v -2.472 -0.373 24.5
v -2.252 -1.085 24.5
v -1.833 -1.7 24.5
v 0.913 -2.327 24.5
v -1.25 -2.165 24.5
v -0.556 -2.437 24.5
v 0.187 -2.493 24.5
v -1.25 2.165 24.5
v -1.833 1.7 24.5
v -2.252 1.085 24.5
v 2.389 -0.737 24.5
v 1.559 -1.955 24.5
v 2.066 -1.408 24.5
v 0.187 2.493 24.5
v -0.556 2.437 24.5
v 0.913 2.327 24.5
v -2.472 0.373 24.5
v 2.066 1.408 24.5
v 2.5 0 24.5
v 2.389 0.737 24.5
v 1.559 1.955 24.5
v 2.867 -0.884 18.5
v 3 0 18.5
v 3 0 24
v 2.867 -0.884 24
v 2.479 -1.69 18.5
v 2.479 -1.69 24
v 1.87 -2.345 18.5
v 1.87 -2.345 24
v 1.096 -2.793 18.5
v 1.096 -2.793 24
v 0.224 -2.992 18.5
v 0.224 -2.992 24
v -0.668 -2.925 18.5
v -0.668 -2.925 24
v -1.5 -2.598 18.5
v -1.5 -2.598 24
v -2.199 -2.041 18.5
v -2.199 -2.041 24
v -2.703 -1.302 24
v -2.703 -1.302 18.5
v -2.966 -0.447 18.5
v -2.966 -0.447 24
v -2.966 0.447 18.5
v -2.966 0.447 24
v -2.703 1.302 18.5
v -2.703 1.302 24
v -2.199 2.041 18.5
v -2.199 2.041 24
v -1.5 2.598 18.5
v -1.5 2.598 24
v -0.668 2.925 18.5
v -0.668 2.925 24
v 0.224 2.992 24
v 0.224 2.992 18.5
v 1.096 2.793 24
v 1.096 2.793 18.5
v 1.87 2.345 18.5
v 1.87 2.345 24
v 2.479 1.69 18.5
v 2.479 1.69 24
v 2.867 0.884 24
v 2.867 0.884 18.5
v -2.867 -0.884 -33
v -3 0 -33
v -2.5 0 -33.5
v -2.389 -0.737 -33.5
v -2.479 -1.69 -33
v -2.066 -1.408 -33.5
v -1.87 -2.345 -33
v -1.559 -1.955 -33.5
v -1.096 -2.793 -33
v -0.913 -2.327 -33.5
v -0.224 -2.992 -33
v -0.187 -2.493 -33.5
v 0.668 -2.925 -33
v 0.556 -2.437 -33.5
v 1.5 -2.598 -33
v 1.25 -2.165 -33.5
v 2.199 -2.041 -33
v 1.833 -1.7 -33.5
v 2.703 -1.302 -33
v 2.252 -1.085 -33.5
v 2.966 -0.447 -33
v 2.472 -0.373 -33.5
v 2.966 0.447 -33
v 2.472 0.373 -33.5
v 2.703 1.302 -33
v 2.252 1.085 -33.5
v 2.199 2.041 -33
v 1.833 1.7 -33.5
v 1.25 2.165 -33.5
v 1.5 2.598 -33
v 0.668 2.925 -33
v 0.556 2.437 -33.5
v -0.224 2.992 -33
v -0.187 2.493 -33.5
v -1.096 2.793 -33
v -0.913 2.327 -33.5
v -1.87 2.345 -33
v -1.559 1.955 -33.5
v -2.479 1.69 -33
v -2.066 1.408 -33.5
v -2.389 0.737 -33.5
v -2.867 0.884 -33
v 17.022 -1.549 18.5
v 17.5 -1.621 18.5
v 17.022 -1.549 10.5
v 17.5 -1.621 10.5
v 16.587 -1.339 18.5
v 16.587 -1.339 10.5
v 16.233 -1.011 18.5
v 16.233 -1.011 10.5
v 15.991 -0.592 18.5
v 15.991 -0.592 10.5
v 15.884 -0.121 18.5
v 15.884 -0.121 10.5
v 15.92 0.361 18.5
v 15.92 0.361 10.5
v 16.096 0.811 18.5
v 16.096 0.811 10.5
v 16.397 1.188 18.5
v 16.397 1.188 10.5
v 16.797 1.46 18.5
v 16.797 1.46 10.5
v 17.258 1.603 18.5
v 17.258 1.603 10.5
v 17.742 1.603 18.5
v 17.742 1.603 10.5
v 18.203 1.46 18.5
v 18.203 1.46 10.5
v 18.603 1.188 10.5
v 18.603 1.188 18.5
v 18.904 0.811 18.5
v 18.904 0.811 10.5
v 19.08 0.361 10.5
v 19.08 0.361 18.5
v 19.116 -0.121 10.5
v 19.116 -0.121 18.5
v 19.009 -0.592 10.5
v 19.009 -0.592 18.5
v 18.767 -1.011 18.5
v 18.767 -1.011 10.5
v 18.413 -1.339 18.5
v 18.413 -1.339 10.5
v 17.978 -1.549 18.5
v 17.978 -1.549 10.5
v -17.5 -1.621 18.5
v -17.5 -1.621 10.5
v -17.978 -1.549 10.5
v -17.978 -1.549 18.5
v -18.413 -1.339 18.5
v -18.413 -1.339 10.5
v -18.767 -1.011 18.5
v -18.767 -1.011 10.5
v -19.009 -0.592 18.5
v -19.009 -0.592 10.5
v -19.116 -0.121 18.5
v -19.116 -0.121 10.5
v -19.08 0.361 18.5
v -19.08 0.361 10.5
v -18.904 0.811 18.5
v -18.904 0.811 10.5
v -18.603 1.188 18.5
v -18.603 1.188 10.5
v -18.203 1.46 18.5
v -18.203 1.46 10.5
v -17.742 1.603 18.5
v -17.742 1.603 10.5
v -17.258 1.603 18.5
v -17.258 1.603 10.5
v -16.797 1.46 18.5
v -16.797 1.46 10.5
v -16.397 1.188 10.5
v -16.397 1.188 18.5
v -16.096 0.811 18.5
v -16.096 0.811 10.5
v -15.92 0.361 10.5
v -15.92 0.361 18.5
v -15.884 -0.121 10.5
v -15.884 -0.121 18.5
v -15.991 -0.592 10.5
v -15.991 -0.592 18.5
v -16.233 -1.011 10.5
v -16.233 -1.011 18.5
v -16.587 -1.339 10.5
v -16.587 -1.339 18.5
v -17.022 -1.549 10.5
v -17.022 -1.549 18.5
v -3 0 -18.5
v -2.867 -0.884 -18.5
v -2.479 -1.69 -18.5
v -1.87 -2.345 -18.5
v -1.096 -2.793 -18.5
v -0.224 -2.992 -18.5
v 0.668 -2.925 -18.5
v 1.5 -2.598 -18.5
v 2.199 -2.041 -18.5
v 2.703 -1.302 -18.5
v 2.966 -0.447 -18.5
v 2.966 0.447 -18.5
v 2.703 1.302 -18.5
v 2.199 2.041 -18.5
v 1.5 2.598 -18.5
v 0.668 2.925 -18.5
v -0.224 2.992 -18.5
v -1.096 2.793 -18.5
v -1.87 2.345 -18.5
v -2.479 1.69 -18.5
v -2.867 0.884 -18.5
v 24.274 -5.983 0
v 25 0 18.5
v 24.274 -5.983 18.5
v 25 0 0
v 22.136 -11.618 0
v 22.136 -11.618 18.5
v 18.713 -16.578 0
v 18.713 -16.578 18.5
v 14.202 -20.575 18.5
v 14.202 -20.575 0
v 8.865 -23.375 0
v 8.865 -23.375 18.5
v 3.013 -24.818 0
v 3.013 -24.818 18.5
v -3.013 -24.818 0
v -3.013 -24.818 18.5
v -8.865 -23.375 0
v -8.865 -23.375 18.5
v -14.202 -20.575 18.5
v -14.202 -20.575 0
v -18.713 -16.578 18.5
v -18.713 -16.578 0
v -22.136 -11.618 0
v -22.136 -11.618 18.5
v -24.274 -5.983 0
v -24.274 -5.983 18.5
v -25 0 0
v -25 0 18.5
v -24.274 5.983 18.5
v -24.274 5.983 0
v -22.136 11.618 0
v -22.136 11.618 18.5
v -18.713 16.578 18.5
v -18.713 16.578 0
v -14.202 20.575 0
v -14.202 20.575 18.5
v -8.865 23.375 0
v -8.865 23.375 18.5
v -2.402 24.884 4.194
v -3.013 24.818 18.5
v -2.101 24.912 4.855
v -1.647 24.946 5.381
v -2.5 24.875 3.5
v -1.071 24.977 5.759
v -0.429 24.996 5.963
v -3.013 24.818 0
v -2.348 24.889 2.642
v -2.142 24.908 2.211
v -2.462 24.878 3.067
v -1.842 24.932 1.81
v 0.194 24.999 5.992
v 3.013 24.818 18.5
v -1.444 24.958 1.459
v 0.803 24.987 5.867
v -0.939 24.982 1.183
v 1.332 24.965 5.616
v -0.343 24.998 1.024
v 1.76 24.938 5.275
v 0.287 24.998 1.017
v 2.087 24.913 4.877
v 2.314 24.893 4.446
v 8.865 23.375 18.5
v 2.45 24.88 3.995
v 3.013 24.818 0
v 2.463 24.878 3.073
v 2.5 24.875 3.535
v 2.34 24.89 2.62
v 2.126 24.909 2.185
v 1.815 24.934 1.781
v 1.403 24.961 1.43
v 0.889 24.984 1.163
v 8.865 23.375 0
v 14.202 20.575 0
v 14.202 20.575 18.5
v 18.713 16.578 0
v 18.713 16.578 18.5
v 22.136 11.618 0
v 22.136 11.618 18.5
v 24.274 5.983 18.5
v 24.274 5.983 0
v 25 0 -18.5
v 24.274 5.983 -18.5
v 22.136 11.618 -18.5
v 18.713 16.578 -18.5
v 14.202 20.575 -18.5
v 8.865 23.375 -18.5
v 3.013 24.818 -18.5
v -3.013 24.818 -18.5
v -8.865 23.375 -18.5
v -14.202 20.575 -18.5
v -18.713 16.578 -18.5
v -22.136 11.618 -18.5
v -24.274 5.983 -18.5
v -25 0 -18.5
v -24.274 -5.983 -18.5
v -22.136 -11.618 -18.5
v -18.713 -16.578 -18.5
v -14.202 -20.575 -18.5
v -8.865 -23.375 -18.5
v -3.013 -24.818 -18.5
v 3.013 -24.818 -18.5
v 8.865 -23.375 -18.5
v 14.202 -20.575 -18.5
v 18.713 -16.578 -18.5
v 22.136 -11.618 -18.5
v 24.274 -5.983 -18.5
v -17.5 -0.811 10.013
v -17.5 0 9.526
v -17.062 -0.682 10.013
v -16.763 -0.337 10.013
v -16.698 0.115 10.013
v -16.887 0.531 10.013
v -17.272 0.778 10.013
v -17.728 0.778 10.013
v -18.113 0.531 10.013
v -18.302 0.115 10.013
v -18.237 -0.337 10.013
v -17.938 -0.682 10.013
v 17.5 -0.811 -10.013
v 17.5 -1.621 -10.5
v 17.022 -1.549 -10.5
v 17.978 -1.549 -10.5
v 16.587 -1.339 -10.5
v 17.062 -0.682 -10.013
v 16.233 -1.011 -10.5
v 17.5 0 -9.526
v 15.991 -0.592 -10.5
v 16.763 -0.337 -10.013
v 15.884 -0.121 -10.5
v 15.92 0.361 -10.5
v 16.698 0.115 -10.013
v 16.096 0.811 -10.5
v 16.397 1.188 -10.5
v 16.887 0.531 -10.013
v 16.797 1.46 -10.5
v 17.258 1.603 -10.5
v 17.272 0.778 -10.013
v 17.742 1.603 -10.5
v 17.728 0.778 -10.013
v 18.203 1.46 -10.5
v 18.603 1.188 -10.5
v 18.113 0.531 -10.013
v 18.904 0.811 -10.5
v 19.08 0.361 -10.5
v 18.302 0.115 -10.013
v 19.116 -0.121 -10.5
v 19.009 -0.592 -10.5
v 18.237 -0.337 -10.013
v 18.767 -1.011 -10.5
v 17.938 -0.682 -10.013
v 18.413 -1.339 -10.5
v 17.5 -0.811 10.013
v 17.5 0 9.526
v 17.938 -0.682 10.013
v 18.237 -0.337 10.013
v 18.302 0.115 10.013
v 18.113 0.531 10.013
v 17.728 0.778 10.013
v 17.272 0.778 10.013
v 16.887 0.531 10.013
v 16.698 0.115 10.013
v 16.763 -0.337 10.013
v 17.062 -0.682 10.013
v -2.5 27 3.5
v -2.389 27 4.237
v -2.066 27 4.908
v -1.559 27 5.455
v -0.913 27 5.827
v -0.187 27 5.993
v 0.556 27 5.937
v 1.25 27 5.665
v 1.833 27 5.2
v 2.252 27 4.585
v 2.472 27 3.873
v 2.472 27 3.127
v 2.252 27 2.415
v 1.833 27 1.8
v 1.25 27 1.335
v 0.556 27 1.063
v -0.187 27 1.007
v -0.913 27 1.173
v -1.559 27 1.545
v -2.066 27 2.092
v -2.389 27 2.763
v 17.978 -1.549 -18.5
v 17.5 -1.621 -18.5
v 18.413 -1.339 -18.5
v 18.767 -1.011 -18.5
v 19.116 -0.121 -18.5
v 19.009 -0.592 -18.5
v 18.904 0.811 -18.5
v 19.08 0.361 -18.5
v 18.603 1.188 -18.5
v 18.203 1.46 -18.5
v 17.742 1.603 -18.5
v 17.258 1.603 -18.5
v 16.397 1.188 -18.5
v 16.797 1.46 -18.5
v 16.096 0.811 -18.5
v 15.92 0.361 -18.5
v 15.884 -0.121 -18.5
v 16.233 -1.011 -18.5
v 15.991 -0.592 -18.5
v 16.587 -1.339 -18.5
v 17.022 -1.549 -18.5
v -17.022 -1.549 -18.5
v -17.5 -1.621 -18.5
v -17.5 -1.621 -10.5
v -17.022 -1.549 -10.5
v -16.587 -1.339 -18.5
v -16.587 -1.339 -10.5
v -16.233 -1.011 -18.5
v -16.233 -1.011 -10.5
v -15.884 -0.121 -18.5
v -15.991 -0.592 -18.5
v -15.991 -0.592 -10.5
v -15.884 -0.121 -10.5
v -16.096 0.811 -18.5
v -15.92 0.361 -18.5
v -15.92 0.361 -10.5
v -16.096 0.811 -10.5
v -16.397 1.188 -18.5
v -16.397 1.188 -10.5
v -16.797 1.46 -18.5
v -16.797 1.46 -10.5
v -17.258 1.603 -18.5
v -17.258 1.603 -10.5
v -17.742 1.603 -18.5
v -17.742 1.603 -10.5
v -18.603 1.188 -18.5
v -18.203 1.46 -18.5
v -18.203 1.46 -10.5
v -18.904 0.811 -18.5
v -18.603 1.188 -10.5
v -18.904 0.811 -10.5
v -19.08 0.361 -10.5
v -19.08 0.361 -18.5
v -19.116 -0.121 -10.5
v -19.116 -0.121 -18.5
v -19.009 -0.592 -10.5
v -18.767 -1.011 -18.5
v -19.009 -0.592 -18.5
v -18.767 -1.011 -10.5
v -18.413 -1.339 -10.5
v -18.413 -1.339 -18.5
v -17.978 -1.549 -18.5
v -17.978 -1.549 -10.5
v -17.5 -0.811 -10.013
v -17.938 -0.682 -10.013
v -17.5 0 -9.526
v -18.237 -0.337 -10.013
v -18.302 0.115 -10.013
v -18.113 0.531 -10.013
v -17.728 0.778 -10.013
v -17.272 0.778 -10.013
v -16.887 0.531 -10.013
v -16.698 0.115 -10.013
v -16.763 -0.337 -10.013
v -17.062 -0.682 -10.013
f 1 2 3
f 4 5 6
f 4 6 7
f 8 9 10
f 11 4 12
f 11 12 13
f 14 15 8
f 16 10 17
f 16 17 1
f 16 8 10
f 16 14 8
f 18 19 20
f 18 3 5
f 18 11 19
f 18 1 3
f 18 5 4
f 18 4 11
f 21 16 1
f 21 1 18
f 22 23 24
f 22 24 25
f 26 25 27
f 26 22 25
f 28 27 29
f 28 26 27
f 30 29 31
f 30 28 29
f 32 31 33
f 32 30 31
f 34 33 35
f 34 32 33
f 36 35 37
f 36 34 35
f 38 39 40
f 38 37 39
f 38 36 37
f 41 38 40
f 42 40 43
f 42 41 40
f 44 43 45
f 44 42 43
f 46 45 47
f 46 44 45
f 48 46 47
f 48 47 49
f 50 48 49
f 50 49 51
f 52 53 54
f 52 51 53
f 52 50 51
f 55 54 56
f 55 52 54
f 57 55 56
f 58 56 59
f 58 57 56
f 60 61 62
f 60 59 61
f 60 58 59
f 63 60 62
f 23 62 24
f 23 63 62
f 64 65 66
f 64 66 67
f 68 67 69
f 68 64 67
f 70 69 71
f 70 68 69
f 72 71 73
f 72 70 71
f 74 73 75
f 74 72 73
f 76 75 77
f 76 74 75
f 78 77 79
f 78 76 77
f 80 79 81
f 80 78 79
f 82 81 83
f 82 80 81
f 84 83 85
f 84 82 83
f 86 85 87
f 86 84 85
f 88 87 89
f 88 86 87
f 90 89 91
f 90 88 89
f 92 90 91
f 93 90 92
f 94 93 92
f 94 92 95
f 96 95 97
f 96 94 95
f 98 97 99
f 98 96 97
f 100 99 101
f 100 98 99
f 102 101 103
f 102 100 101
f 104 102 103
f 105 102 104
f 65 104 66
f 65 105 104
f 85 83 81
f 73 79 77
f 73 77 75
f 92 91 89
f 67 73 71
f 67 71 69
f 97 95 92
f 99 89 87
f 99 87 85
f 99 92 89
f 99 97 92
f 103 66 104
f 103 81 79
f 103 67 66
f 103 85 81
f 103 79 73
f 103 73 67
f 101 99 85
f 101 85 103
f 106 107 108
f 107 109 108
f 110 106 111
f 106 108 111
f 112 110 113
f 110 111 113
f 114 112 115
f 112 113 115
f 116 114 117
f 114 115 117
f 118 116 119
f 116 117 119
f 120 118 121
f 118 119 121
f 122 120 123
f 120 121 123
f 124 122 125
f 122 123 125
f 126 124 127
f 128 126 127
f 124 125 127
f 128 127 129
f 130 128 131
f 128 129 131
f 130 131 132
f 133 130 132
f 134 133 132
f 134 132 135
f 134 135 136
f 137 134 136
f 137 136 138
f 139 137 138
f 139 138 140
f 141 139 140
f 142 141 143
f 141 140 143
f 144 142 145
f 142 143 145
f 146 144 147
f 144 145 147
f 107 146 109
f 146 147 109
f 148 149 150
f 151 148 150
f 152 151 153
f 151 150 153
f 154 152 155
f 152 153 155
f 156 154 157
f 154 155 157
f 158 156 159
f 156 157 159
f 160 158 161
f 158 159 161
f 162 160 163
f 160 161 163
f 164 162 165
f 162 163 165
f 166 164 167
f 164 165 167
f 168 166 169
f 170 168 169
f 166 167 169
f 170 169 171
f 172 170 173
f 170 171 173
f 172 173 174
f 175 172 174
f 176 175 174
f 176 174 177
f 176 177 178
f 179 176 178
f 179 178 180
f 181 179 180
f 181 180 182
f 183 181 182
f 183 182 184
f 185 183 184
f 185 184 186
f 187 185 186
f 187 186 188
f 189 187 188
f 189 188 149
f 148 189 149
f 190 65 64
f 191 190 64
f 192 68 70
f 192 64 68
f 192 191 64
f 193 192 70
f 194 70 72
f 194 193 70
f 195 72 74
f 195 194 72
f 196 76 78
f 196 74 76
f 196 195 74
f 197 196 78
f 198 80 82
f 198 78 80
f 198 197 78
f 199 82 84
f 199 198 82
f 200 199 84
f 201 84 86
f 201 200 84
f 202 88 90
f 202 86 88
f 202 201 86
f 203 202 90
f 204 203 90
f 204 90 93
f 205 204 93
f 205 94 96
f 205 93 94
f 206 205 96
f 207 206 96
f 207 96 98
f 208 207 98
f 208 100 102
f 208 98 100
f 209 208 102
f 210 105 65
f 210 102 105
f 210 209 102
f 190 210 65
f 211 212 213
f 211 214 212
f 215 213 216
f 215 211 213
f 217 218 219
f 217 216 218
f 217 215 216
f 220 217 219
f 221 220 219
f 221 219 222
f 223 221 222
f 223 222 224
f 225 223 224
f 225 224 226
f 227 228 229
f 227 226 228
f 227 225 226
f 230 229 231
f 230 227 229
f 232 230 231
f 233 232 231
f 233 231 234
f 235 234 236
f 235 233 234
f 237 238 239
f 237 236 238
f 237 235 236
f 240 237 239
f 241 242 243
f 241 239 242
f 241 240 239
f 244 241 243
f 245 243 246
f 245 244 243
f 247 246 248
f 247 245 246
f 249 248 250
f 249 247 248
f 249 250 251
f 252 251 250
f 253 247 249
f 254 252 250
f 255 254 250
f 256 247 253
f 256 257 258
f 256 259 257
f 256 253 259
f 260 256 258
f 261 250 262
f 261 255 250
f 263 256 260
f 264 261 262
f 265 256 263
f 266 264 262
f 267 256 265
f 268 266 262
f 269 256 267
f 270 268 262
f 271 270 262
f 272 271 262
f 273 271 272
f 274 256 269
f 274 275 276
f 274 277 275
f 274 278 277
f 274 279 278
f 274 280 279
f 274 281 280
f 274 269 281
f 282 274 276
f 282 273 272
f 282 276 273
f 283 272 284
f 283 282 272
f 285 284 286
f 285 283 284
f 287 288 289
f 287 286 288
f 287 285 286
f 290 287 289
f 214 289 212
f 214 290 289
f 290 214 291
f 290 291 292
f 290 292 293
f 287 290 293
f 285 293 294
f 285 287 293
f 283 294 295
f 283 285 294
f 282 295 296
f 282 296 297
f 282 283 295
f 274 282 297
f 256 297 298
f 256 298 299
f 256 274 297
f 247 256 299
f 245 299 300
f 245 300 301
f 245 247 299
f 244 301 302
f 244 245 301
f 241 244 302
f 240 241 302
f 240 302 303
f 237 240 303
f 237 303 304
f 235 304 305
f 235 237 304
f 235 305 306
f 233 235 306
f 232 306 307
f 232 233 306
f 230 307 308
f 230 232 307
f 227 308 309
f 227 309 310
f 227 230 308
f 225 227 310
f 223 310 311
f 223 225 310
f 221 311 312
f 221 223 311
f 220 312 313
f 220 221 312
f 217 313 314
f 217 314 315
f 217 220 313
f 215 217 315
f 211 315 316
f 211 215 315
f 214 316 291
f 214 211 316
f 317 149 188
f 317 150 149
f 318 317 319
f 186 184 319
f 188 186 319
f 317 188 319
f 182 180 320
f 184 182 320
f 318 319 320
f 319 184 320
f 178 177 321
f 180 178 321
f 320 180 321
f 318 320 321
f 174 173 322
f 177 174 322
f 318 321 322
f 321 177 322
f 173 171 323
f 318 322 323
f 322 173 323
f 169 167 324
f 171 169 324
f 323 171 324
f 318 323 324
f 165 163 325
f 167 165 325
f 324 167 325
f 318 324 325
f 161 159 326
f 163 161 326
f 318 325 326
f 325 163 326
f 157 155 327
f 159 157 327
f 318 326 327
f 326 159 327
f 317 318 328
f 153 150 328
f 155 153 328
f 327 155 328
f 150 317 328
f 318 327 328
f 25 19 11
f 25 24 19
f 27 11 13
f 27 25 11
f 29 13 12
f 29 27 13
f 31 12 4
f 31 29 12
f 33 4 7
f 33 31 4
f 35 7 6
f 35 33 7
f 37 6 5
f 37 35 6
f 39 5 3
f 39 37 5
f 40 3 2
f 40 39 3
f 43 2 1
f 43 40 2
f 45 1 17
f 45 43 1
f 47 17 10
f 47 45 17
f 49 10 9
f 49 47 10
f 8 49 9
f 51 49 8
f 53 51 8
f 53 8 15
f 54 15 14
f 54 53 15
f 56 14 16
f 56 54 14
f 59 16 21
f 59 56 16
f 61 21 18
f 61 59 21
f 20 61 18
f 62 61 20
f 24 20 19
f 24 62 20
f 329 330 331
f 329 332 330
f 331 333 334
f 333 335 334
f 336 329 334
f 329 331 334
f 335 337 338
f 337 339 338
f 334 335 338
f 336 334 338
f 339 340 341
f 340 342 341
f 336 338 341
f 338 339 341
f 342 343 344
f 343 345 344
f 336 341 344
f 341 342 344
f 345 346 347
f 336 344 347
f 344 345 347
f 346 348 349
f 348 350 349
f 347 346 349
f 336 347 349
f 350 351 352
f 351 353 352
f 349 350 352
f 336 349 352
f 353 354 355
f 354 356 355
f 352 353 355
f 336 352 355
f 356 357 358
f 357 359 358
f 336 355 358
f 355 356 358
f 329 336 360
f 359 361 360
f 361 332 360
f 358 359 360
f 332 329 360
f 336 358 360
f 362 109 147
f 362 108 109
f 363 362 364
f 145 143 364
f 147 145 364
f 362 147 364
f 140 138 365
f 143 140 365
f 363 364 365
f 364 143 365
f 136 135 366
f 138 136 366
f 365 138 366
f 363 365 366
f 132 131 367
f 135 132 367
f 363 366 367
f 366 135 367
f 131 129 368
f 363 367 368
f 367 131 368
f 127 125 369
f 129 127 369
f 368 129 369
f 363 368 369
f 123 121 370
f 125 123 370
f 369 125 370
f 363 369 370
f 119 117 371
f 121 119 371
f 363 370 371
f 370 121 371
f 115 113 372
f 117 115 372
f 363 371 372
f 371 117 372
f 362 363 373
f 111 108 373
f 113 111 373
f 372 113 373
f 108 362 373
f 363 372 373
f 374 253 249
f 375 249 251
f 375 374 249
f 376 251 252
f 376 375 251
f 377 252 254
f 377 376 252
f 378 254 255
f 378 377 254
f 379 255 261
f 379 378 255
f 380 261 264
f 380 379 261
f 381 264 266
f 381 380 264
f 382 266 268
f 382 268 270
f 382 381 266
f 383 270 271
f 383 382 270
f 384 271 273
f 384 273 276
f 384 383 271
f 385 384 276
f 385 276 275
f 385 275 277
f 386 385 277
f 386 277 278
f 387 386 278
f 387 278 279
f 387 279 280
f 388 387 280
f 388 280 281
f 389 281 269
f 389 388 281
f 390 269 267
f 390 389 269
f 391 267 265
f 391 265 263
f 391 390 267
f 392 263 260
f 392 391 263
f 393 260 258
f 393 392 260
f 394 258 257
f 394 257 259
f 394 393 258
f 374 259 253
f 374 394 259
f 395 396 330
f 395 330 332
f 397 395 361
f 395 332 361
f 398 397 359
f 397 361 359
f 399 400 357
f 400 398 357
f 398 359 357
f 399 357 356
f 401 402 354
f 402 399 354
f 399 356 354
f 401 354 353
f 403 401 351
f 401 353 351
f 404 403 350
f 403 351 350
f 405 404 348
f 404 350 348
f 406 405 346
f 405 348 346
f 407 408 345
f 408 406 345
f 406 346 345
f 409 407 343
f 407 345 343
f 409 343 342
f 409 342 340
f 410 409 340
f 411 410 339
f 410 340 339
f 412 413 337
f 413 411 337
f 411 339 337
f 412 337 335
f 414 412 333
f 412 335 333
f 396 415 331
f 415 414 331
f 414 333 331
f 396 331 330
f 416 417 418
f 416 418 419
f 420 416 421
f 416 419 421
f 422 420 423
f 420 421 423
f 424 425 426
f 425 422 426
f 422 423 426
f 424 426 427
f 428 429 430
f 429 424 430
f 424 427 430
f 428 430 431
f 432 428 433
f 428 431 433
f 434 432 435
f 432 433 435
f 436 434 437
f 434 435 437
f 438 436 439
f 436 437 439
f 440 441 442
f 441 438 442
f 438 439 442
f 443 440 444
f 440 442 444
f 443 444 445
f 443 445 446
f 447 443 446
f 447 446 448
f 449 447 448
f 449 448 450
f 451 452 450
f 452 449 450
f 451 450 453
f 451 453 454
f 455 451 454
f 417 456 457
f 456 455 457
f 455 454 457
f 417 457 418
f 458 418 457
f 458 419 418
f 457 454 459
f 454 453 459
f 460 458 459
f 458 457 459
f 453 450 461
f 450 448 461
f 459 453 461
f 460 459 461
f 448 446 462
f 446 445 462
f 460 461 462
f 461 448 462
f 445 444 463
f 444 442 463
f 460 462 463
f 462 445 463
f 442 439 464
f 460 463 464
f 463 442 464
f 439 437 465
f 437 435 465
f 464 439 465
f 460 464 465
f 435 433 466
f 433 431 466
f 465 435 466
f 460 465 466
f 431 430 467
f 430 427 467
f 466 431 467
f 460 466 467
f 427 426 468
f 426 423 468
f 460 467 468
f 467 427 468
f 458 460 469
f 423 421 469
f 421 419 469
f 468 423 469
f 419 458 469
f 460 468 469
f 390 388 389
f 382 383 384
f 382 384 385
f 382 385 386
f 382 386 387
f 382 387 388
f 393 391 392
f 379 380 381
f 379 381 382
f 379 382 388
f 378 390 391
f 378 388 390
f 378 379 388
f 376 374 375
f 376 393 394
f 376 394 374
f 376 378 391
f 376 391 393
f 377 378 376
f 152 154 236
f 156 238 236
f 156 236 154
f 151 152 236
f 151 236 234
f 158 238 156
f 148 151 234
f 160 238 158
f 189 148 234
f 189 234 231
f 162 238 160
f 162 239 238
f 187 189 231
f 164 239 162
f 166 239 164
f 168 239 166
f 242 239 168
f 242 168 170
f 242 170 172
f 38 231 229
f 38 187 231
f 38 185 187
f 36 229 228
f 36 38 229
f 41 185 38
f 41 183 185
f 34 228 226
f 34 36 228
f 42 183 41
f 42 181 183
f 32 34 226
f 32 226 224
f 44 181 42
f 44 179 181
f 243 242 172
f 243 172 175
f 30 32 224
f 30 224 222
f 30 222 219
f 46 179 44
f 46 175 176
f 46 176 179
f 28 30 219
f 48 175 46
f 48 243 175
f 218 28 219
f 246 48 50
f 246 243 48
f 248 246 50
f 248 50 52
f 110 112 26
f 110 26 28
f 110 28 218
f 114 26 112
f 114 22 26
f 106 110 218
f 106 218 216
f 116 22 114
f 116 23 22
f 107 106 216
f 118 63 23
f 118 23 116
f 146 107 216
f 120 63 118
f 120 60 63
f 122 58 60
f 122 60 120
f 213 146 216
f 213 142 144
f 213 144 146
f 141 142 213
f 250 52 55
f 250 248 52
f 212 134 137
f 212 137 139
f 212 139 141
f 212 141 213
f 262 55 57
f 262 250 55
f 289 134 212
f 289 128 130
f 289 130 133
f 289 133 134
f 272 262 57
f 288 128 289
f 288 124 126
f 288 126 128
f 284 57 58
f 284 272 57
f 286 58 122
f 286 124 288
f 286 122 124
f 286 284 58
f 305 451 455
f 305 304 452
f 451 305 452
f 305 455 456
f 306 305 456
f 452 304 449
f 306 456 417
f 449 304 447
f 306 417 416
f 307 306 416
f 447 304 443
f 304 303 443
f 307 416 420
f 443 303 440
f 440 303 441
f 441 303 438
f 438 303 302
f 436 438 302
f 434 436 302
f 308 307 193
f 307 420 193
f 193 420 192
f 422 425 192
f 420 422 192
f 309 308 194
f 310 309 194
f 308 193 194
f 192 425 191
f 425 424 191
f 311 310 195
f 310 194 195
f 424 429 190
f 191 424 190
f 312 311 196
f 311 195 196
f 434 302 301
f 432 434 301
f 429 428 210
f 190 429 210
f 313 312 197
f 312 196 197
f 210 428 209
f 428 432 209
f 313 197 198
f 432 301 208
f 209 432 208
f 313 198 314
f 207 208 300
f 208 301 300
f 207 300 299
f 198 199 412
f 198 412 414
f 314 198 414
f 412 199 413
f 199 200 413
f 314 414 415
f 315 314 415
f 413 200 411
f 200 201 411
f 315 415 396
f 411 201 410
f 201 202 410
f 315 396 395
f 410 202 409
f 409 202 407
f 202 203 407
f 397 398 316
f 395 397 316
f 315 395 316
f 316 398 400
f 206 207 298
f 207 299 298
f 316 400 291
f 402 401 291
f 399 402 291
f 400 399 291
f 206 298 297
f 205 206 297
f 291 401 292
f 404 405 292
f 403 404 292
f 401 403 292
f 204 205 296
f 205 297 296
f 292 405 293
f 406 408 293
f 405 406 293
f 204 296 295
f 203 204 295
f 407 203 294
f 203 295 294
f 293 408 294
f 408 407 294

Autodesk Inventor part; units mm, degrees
ref_plane "YZ Plane" through (0, 0, 0) normal (1, 0, 0) x (0, 1, 0)
ref_plane "XY Plane" through (0, 0, 0) normal (0, 0, 1) x (1, 0, 0)
sketch "Skizze1" plane through (0, 0, 0) normal (0, 0, 1) x (1, 0, 0)
  circle A0 centre (0, 0) radius 25
  dimension "d0" = 50
extrude "Extrusion1" add sketch "Skizze1" along normal mid plane 37
sketch "Skizze2" plane through (0, 0, 18.5) normal (0, 0, 1) x (1, 0, 0)
  circle A0 centre (0, 0) radius 25 projected
  circle A1 centre (0, 0) radius 3
  dimension "d3" = 6
extrude "Extrusion2" add sketch "Skizze2" along normal blind 6 contours A1
sketch "Skizze3" plane through (0, 0, -18.5) normal (0, 0, -1) x (-1, 0, 0)
  circle A0 centre (0, 0) radius 25 projected
  circle A1 centre (0, 0) radius 3
  dimension "d6" = 6
extrude "Extrusion3" add sketch "Skizze3" along normal blind 15 contours A1
chamfer "Fase1" distance 0.5 angle 45 2 edges at (3, 0, -33.5) (-3, 0, 24.5)
sketch "Skizze4" plane through (0, 0, 18.5) normal (0, 0, 1) x (1, 0, 0)
  circle A0 centre (0, 0) radius 3 projected
  line L0 (-17.5, 0) -> (17.5, 0) construction
  dimension "d12" = 35
hole "Bohrung1" at (-17.5, 0, 18.5) at (17.5, 0, 18.5) direction (0, 0, -1) diameter 3.242 depth 8 tip angle 118 thread size "M4x0.7" class "6H" standard "ISO Metric profile"
mirror "Spiegeln1" about plane through (0, 0, 0) normal (0, 0, 1) of "Bohrung1"
ref_plane "Arbeitsebene1" through (0, 25, 0) normal (0, 1, 0) x (-1, 0, 0)
sketch "Skizze5" plane through (0, 25, 0) normal (0, 1, 0) x (-1, 0, 0)
  line L0 (-25, -18.5) -> (25, -18.5) projected
  line L1 (25, 18.5) -> (-25, 18.5) projected
  circle A0 centre (0, 3.5) radius 2.5
  point P0 (0, 0)
  dimension "d20" = 15
  dimension "d21" = 5
extrude "Extrusion4" add sketch "Skizze5" against normal blind 2 and the other way blind 2
properties part number "Tunel_Motor"
